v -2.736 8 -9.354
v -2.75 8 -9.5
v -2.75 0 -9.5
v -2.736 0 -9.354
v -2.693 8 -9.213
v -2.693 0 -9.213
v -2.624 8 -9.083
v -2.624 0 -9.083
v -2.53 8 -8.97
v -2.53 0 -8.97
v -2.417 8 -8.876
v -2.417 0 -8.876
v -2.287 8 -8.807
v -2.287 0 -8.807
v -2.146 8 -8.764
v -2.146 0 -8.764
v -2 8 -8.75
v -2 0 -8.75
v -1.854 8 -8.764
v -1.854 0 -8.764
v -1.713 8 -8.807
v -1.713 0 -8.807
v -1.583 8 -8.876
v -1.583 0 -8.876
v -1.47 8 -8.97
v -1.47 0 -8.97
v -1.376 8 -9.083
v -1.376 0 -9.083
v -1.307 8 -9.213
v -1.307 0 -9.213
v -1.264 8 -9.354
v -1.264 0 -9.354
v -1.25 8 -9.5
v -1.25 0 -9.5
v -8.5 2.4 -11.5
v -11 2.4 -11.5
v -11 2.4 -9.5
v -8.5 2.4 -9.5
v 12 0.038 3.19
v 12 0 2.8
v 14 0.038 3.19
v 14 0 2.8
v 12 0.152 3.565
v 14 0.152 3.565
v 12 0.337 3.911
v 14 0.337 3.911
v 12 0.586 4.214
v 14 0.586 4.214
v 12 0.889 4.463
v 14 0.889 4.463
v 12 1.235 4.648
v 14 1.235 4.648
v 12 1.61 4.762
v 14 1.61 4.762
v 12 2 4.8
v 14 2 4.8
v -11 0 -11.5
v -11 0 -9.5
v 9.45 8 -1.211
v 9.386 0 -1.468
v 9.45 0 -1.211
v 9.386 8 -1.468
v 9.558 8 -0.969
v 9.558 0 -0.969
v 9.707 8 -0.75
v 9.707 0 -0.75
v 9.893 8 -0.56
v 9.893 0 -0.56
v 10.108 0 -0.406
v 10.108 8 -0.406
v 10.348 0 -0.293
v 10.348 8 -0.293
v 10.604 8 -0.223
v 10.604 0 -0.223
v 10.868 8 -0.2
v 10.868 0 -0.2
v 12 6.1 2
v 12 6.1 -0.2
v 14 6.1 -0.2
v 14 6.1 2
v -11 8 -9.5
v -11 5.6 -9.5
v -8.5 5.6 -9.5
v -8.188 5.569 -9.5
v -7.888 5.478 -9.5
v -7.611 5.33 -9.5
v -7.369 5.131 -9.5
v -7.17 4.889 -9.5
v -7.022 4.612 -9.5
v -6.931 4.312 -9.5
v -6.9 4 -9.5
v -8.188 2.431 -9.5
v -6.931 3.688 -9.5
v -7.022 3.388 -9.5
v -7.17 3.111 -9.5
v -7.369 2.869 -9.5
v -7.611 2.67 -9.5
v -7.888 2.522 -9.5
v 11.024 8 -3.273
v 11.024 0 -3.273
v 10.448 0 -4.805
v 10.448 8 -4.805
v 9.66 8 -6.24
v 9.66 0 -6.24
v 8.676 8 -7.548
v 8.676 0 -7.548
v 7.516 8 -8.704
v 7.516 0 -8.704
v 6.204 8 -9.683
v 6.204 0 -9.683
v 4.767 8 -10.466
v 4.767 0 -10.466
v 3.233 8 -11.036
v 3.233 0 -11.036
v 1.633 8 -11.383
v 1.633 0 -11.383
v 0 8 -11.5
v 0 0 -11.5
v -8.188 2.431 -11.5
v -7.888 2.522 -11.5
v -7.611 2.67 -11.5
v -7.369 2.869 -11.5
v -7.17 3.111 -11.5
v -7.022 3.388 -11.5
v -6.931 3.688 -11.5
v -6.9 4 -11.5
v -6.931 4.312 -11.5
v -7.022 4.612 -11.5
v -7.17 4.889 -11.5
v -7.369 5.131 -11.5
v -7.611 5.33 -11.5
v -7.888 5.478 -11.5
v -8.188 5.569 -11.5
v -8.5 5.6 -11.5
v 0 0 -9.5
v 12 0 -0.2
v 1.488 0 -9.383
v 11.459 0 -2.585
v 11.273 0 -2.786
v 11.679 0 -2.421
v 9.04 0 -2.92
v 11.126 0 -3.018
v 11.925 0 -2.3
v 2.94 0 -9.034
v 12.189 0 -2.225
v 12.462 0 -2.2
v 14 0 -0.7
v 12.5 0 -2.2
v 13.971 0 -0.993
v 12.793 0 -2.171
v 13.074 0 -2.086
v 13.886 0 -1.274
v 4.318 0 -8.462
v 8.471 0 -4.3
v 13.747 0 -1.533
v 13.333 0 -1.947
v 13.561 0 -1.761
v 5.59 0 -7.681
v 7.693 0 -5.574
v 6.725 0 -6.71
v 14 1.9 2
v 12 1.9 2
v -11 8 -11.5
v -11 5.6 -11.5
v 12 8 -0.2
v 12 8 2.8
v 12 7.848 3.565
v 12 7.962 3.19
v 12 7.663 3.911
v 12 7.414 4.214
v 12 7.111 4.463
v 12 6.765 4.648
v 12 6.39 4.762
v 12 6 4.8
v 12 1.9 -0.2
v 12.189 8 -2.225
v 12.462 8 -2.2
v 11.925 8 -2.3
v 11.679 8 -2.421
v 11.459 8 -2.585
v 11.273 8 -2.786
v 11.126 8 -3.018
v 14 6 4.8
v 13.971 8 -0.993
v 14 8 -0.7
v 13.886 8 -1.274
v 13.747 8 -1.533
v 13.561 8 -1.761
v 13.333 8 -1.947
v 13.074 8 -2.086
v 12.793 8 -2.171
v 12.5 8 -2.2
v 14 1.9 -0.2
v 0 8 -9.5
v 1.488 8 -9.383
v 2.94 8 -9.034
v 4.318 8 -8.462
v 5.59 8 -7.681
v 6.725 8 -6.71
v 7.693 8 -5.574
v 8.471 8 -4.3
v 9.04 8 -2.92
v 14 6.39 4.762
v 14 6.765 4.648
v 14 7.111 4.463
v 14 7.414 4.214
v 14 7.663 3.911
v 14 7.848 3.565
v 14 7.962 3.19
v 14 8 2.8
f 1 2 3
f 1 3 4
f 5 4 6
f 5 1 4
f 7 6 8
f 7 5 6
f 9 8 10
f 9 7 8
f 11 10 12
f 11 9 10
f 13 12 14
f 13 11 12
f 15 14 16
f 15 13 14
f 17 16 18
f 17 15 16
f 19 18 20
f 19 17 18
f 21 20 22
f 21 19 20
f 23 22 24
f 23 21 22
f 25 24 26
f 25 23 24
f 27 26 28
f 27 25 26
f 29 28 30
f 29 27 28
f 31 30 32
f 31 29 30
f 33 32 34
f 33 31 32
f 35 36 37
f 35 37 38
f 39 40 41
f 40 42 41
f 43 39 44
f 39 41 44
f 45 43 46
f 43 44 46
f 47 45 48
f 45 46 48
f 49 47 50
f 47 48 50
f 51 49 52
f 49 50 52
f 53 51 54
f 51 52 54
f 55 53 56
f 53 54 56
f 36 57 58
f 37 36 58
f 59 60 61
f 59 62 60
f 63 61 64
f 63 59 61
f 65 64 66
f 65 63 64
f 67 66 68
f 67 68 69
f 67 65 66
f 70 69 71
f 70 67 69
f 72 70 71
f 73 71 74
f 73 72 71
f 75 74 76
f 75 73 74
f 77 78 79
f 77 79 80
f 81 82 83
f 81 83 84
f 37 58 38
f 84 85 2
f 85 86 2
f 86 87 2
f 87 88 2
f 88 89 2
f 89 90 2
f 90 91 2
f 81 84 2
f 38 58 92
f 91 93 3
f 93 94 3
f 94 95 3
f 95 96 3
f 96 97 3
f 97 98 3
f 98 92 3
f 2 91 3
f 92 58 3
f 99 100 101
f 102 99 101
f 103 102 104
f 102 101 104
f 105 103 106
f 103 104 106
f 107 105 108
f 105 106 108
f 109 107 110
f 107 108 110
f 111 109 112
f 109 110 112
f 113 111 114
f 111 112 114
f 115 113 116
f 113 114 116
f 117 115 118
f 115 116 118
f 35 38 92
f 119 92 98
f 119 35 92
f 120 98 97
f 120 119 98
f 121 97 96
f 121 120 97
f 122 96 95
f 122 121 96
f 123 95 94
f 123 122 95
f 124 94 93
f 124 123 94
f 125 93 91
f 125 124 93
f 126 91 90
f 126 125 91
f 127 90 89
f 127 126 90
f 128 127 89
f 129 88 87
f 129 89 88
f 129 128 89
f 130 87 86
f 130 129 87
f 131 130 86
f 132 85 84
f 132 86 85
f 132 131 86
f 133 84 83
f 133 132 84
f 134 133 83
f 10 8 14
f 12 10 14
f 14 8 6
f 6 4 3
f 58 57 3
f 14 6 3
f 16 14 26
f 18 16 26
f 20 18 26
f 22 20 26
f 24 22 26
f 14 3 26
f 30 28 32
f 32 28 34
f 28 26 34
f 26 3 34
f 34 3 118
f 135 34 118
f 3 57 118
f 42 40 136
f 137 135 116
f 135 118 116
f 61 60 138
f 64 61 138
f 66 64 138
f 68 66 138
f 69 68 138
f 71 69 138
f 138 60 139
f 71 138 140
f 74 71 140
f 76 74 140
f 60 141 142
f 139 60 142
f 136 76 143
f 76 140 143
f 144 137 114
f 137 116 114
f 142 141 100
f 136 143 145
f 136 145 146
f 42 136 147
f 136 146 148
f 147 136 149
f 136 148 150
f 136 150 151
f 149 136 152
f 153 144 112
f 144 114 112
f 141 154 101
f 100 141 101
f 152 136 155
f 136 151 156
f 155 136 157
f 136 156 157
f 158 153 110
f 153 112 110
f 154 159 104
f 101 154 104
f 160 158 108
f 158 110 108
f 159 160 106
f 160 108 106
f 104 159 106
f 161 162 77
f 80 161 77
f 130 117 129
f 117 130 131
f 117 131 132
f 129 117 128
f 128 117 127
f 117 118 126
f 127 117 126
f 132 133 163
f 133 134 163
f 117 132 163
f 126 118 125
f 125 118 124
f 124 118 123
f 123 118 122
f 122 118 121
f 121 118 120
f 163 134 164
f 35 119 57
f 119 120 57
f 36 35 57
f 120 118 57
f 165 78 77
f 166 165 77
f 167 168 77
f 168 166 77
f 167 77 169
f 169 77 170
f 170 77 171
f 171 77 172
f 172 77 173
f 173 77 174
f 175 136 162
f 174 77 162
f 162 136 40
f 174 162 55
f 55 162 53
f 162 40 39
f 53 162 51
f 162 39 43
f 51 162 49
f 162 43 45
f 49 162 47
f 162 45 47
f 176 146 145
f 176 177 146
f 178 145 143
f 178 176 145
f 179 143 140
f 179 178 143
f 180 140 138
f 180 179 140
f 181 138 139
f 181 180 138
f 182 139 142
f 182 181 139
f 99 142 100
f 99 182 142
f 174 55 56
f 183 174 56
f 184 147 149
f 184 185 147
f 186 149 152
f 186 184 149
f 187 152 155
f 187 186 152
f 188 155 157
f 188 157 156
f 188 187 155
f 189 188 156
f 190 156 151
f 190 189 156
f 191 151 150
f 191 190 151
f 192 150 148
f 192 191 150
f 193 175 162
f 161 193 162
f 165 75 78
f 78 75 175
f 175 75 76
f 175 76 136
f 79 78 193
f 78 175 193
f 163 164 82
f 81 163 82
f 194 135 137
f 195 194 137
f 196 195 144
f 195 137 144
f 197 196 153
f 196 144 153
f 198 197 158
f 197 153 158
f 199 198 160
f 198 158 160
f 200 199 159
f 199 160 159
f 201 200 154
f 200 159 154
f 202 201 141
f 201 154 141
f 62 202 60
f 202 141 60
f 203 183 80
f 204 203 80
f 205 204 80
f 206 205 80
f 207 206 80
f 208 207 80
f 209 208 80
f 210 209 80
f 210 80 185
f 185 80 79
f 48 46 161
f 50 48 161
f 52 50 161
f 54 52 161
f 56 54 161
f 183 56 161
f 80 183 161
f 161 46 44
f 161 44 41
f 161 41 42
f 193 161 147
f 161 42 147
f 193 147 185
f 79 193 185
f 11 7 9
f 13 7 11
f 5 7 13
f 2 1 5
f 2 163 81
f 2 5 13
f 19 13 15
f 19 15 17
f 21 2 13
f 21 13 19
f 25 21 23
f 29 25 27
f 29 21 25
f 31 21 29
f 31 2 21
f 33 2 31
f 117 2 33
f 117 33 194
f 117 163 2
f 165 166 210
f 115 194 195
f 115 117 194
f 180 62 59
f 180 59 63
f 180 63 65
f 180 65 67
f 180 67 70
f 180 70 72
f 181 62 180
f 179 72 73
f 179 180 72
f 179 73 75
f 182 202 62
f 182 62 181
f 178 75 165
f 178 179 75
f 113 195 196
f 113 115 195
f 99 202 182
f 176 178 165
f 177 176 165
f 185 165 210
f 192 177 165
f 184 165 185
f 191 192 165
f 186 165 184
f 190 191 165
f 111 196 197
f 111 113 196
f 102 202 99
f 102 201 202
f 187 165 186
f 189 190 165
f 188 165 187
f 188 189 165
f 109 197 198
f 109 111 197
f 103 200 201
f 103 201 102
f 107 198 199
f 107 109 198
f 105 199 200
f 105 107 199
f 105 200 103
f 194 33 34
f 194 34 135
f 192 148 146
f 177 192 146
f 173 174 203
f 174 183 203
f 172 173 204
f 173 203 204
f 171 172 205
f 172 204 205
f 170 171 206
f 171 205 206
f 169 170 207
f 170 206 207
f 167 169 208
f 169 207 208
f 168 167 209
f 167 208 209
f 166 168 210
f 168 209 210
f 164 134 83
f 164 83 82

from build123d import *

# Parameters (mm, degrees)
EXTRUDE_1_DEPTH     = 8
CUT_EXTRUDE_1_REACH = 28.93
SKETCH_3_W          = 2.2
SKETCH_3_H          = 4.2
CUT_EXTRUDE_2_REACH = 24.928
FILLET_1_R          = 1.5
FILLET_2_R          = 2
SKETCH_5_R          = 0.75
EXTRUDE_1_2_DEPTH   = 8


with BuildPart() as part:
    # 草图1 → Extrude 1 (new body)
    with BuildSketch(Plane(origin=(0, 0, 0), x_dir=(1, 0, 0), z_dir=(0, 1, 0))):
        with BuildLine():
            Line((-11, 9.5), (0, 9.5))
            ThreePointArc((0, 9.5), (6.646427612, 6.787856805), (9.497894504, 0.2))
            Line((9.497894504, 0.2), (12, 0.2))
            Line((12, 0.2), (12, -4.8))
            Line((12, -4.8), (14, -4.8))
            Line((14, -4.8), (14, 2.2))
            Line((14, 2.2), (11.28760382, 2.2))
            ThreePointArc((11.28760382, 2.2), (7.312660255, 8.875528153), (0, 11.5))
            Line((0, 11.5), (-11, 11.5))
            Line((-11, 11.5), (-11, 9.5))
        make_face()
    extrude(amount=EXTRUDE_1_DEPTH)

    # 草图3 → 切除-拉伸1 (cut, up to next)
    with BuildSketch(Plane.ZY.offset(-12), mode=Mode.PRIVATE) as cut_extrude_1_sk1:
        with Locations((0.9, 4)):
            Rectangle(SKETCH_3_W, SKETCH_3_H)
    cut_extrude_1_tool1 = extrude(cut_extrude_1_sk1.sketch, amount=-CUT_EXTRUDE_1_REACH, mode=Mode.PRIVATE) & part.part
    add(cut_extrude_1_tool1.solids().sort_by_distance((12, 4, 0.9))[0], mode=Mode.SUBTRACT)

    # 草图4 → 切除-拉伸2 (cut, up to next)
    with BuildSketch(Plane(origin=(0, 0, -11.5), x_dir=(-1, 0, 0), z_dir=(0, 0, -1)), mode=Mode.PRIVATE) as cut_extrude_2_sk1:
        with BuildLine():
            Line((11, 2.4), (8.5, 2.4))
            ThreePointArc((8.5, 2.4), (6.9, 4), (8.5, 5.6))
            Line((8.5, 5.6), (11, 5.6))
            ThreePointArc((11, 5.6), (12.6, 4), (11, 2.4))
        make_face()
    cut_extrude_2_tool1 = extrude(cut_extrude_2_sk1.sketch, amount=-CUT_EXTRUDE_2_REACH, mode=Mode.PRIVATE) & part.part
    add(cut_extrude_2_tool1.solids().sort_by_distance((-9.75, 4, -11.5))[0], mode=Mode.SUBTRACT)

    # 圆角1
    fillet_1_edges = [part.edges().sort_by_distance(p)[0] for p in [
        (11.28760382, 4, -2.2),
        (14, 4, -2.2),
        (9.497894504, 4, -0.2),
    ]]
    fillet(fillet_1_edges, radius=FILLET_1_R)

    # 圆角2
    fillet_2_edges = [part.edges().sort_by_distance(p)[0] for p in [
        (13, 8, 4.8),
        (13, 0, 4.8),
    ]]
    fillet(fillet_2_edges, radius=FILLET_2_R)

    # 草图5 → Extrude 1 2 (add)
    with BuildSketch(Plane(origin=(0, 8, 0), x_dir=(1, 0, 0), z_dir=(0, 1, 0))):
        with Locations((-2, 9.5)):
            Circle(SKETCH_5_R)
    extrude(amount=-EXTRUDE_1_2_DEPTH)


solid = part.part
